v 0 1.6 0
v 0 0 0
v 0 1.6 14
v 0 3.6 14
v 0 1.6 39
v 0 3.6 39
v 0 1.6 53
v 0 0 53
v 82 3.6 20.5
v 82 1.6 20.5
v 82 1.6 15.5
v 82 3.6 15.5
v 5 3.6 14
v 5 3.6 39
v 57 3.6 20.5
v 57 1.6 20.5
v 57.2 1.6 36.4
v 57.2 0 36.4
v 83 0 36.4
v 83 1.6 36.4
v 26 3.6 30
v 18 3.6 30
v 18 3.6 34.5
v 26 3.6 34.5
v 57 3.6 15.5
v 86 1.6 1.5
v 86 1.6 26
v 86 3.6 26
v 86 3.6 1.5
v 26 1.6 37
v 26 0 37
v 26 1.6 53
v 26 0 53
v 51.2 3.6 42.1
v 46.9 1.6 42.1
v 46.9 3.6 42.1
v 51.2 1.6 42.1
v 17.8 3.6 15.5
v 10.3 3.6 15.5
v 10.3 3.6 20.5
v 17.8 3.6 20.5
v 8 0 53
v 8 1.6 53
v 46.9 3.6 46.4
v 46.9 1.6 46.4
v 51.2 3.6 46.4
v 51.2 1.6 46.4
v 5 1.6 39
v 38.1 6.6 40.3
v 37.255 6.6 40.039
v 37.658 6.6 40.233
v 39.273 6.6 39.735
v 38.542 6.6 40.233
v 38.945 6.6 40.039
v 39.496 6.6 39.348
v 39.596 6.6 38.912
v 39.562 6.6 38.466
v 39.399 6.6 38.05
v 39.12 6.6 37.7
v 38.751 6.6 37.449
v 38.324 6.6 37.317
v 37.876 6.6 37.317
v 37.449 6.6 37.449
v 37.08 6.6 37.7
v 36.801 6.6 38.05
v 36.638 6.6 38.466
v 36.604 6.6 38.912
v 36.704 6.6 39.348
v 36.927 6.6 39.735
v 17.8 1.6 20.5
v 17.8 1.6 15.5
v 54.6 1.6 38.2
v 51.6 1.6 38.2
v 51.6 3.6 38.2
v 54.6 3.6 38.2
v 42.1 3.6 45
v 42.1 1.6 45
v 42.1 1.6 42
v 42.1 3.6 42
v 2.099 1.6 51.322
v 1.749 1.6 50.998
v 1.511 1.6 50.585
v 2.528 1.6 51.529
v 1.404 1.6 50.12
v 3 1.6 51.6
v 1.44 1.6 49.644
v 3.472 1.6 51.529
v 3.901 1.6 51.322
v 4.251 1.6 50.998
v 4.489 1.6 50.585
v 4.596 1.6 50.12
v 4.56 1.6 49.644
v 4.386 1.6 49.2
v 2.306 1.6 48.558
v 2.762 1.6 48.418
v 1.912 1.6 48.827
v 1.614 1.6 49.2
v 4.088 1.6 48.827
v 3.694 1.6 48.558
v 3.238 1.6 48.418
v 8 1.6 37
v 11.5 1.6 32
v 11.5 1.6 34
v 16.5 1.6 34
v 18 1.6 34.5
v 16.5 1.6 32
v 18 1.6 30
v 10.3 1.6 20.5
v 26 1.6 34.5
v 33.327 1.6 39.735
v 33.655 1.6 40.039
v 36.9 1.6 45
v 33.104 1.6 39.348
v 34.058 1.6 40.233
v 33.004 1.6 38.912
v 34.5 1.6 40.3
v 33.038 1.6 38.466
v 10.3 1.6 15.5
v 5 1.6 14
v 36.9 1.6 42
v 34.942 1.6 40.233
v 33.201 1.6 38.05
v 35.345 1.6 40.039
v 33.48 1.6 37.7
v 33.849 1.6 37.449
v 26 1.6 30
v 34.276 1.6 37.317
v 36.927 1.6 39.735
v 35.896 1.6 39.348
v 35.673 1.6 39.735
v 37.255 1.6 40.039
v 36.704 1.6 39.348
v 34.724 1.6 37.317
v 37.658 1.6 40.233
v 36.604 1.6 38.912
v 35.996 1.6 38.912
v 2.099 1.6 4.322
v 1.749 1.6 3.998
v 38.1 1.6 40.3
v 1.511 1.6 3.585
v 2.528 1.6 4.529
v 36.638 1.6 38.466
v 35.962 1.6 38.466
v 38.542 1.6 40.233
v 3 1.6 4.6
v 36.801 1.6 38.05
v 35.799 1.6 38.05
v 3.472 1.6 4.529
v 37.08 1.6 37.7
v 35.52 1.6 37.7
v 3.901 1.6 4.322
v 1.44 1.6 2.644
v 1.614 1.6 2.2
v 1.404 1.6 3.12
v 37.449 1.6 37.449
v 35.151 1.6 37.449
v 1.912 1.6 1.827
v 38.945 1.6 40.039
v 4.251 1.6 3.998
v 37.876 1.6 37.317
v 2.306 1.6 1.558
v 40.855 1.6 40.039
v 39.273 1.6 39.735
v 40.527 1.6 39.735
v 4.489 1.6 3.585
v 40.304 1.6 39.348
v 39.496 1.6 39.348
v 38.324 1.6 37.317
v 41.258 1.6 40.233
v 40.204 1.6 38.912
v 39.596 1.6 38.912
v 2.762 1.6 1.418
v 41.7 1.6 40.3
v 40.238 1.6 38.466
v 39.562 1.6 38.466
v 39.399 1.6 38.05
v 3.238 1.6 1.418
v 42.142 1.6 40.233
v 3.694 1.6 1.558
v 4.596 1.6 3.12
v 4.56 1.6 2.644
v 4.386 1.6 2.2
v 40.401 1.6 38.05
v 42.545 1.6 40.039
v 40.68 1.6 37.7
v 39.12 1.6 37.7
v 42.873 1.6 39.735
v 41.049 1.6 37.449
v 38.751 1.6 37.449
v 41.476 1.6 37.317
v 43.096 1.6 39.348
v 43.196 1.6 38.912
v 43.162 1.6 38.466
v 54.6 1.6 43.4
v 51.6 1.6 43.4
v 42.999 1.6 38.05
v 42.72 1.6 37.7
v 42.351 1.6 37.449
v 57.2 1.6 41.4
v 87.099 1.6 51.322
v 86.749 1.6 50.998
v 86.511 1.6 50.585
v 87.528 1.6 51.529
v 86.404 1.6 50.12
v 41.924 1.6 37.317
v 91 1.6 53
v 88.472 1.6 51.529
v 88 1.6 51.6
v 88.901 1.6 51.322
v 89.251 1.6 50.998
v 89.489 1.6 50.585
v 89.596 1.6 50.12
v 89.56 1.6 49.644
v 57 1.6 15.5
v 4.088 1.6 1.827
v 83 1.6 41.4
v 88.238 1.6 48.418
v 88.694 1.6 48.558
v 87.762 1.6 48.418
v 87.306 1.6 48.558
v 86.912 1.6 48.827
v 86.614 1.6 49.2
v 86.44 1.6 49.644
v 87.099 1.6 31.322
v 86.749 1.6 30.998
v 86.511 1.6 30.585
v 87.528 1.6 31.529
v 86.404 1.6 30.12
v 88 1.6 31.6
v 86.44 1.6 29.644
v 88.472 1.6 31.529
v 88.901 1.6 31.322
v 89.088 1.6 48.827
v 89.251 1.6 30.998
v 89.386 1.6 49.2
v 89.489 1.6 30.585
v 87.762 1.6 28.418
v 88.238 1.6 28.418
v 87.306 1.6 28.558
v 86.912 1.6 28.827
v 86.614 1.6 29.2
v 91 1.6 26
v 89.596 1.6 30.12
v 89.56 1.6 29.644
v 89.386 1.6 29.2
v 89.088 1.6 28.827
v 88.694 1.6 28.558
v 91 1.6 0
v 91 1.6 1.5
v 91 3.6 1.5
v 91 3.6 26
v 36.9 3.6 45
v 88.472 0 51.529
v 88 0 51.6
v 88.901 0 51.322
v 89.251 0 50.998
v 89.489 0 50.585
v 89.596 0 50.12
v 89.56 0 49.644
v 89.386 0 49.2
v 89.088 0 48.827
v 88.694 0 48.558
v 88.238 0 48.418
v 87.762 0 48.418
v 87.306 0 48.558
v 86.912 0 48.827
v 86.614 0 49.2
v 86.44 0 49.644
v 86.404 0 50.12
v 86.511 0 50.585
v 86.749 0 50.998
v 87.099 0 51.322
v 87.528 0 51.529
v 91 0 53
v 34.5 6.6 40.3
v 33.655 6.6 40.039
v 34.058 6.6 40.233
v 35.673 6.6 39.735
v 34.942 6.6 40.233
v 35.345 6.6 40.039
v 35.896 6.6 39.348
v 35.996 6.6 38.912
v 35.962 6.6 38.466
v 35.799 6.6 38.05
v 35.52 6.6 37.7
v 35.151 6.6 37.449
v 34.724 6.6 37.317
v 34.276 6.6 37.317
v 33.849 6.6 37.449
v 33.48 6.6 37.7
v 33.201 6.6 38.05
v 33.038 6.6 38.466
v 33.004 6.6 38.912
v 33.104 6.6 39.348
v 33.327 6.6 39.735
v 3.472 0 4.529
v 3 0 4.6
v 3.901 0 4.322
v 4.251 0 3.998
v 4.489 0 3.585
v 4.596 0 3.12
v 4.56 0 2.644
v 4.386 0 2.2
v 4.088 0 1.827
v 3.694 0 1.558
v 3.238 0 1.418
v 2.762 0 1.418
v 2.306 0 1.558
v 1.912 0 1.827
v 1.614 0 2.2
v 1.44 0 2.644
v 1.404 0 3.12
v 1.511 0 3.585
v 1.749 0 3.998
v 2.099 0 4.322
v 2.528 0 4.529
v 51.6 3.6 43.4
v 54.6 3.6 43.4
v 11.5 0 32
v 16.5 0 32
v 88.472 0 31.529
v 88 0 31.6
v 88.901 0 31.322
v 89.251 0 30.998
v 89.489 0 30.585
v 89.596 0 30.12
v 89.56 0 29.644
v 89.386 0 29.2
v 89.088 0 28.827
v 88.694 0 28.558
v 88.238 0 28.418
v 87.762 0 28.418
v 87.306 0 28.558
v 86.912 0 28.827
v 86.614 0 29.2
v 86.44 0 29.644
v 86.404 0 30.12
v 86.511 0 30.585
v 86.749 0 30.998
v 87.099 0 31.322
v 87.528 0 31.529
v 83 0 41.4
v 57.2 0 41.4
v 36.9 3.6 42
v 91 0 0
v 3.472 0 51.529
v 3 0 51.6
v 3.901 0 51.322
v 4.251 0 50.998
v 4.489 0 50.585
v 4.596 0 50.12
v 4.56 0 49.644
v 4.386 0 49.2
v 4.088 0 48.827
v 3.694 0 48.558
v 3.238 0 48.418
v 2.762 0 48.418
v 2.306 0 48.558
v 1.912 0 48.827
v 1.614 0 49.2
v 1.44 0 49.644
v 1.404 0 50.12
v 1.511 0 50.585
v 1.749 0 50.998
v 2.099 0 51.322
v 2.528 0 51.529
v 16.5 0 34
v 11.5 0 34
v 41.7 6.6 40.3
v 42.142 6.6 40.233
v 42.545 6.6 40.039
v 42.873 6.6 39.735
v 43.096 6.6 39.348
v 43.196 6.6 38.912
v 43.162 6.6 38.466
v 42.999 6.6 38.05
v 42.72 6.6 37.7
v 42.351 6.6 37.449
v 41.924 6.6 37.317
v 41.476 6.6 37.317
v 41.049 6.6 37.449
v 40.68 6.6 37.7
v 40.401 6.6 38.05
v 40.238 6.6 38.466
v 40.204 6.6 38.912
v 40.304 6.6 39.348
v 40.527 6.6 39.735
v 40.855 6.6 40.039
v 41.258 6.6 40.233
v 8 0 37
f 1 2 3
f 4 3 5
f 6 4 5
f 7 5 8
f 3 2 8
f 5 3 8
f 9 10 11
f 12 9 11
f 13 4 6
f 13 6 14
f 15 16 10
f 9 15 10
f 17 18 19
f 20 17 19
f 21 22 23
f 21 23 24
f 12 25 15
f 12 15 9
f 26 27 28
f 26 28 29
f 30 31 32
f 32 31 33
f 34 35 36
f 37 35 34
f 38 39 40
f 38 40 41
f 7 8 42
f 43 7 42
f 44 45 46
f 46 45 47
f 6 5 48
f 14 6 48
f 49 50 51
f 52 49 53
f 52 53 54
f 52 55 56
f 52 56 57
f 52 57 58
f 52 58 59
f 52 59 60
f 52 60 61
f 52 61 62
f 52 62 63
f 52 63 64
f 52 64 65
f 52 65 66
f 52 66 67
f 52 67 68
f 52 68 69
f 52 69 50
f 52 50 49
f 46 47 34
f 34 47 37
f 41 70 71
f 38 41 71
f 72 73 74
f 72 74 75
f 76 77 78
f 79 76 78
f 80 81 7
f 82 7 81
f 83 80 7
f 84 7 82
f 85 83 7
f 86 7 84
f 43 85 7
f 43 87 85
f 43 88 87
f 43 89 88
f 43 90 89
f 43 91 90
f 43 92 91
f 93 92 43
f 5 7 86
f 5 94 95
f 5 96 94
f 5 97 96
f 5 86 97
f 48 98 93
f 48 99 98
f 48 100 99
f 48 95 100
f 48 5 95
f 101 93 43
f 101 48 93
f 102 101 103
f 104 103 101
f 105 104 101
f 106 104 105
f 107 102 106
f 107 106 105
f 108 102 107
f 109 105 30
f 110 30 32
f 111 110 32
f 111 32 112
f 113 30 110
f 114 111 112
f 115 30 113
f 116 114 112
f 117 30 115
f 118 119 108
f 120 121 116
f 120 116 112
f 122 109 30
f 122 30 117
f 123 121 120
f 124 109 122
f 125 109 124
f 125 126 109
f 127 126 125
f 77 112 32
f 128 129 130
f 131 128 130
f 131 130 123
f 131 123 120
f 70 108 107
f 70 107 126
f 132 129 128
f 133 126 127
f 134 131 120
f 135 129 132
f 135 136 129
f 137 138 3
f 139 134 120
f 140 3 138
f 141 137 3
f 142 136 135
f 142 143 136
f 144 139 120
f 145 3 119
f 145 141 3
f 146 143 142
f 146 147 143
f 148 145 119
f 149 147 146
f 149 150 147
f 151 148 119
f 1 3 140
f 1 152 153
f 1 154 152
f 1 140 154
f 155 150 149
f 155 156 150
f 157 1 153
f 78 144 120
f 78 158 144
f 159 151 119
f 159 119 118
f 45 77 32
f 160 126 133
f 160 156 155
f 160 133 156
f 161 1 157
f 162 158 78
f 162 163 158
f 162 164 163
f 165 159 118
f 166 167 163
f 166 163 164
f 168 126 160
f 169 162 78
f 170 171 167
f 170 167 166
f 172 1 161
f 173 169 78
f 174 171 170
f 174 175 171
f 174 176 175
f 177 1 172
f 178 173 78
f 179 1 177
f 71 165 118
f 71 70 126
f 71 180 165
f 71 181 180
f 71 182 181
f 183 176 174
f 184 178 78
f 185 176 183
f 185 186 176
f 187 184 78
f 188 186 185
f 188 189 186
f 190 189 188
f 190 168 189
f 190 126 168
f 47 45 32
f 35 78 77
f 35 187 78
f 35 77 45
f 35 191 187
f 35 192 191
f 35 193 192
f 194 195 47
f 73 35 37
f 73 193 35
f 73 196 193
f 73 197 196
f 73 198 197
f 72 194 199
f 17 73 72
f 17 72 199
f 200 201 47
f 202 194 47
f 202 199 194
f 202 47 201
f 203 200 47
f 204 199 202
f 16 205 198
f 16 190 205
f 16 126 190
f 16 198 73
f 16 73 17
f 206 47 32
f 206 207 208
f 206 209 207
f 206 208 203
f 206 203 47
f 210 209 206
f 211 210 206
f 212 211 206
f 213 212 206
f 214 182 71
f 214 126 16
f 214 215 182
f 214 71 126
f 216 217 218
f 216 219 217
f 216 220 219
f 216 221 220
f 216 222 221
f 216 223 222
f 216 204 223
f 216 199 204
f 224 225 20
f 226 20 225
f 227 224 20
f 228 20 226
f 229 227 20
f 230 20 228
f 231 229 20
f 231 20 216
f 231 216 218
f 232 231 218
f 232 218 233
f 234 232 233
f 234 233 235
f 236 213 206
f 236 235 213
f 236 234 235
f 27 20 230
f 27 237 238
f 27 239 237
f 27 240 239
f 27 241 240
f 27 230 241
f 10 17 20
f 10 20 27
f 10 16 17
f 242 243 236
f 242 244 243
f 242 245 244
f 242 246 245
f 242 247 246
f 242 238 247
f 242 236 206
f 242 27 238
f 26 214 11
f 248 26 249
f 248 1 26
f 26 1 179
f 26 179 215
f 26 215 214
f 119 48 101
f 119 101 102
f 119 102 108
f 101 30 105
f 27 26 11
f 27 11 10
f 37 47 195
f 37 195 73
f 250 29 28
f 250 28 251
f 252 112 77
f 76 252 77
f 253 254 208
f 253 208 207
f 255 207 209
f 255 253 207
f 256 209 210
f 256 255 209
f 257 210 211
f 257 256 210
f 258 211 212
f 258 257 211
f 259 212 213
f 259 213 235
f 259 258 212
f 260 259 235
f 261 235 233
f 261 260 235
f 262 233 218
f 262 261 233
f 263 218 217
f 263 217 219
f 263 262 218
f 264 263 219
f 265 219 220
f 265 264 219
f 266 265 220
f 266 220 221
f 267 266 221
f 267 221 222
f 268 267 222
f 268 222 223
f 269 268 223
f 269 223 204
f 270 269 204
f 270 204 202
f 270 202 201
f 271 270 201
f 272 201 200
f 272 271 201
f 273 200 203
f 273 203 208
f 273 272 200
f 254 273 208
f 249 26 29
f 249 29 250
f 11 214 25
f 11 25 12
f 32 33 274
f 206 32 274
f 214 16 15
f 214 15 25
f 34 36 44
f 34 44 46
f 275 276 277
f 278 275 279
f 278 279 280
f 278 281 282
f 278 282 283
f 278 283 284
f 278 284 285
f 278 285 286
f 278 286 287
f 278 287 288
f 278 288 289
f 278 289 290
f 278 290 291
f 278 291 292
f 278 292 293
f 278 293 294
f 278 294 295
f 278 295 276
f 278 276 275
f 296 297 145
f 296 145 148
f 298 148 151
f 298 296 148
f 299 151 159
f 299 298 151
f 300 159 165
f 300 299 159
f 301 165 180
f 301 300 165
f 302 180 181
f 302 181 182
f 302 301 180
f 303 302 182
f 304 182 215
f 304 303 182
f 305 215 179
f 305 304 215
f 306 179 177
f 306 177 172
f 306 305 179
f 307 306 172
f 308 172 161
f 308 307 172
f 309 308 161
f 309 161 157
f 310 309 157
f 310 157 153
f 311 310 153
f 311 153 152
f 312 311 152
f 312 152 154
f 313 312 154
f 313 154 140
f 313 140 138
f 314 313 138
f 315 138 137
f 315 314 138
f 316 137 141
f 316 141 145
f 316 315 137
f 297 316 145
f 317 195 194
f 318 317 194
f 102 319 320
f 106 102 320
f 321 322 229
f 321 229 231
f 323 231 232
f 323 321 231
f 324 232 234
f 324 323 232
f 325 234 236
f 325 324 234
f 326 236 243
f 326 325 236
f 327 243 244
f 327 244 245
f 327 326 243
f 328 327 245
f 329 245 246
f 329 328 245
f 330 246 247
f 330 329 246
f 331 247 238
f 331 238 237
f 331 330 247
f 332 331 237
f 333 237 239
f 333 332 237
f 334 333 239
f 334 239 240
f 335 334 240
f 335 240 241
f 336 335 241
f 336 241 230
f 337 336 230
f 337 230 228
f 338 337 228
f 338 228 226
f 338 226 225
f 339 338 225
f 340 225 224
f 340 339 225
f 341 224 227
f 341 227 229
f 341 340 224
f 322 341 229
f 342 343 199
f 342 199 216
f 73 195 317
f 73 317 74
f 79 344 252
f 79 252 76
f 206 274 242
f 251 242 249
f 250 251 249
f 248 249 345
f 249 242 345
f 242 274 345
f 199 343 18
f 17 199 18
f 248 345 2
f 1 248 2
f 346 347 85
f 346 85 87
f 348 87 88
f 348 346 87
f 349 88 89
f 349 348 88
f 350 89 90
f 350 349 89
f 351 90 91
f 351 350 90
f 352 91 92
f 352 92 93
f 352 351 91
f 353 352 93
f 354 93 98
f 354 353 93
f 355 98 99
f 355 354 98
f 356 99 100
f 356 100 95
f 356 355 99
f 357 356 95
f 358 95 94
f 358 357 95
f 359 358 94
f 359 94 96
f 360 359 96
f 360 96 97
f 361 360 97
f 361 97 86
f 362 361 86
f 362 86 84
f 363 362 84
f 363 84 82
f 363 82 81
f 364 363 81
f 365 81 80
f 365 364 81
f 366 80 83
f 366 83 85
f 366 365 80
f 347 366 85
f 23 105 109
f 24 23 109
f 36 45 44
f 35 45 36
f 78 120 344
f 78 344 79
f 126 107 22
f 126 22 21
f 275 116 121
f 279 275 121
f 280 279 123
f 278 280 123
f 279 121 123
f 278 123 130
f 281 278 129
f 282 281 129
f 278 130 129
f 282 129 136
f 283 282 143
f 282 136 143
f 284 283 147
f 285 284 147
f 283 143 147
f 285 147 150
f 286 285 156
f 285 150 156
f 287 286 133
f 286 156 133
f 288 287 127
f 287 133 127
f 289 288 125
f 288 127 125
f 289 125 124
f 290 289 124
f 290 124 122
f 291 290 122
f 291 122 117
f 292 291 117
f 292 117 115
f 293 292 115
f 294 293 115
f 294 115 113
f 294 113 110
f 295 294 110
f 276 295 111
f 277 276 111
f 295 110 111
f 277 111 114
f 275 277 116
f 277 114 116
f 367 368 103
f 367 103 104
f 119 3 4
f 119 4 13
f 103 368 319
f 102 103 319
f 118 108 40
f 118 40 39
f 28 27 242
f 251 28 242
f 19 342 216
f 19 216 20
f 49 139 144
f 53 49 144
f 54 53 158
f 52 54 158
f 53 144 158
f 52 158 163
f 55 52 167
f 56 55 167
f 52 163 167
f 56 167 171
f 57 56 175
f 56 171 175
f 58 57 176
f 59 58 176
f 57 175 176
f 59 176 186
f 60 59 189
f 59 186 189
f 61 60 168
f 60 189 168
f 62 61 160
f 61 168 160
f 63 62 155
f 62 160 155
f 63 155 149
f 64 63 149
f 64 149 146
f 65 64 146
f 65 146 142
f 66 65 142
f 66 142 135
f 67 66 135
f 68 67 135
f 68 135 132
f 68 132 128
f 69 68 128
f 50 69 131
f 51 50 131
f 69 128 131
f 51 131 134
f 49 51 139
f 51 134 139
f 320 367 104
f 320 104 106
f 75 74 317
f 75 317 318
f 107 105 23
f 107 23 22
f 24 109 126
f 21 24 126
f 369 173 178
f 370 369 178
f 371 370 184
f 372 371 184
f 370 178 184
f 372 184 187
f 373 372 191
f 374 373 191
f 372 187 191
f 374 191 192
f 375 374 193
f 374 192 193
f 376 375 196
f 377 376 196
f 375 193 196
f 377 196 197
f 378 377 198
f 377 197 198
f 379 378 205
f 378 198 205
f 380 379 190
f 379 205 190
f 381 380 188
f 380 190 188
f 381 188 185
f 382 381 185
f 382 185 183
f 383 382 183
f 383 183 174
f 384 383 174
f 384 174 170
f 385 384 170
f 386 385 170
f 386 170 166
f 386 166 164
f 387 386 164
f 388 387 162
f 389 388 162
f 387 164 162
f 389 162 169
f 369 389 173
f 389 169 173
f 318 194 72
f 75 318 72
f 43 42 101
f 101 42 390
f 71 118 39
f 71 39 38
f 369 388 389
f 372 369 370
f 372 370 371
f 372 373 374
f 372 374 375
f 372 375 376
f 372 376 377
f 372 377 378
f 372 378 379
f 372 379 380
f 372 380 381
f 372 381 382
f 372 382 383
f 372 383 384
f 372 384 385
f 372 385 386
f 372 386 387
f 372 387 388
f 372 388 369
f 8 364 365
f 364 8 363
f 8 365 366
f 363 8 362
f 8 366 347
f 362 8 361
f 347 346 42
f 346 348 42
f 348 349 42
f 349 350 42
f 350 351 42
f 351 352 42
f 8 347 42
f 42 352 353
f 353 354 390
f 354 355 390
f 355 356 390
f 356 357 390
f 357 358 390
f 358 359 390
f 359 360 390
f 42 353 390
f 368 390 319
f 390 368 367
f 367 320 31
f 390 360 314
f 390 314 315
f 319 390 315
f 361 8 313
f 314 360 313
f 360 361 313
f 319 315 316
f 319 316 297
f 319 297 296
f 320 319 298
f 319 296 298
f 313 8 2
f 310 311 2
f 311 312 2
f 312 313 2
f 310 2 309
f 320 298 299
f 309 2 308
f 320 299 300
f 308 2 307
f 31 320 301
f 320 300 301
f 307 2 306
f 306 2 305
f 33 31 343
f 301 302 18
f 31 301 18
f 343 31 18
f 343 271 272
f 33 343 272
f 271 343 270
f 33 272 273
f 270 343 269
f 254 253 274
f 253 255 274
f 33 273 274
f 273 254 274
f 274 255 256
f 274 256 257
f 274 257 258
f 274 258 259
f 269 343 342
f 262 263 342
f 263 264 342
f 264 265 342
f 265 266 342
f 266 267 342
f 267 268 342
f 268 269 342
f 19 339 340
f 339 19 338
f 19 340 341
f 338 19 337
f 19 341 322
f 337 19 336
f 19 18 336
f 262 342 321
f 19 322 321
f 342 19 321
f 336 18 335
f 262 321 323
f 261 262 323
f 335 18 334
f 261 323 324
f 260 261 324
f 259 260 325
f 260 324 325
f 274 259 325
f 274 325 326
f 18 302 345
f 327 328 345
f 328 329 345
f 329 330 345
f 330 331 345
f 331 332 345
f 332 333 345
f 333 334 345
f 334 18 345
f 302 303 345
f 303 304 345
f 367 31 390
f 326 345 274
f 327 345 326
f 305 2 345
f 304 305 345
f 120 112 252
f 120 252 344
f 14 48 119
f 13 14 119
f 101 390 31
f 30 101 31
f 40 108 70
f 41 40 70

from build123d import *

# Parameters (mm, degrees)
SKETCH_2_R      = 1.6
SKETCH_2_W      = 5
SKETCH_2_H      = 2
SKETCH_2_W_2    = 25.8
SKETCH_2_H_2    = 5
EXTRUDE_1_DEPTH = 1.6
SKETCH_3_W      = 5
SKETCH_3_H      = 25
SKETCH_3_W_2    = 7.5
SKETCH_3_H_2    = 5
SKETCH_3_W_3    = 8
SKETCH_3_H_3    = 4.5
SKETCH_3_W_4    = 25
SKETCH_3_H_4    = 24.5
EXTRUDE_2_DEPTH = 2
SKETCH_4_R      = 1.5
EXTRUDE_3_DEPTH = 5
SKETCH_5_W      = 5.2
SKETCH_5_H      = 3
SKETCH_5_W_2    = 4.3
SKETCH_5_H_2    = 4.3
SKETCH_5_W_3    = 3
SKETCH_5_H_3    = 5.2
EXTRUDE_4_DEPTH = 2


with BuildPart() as part:
    # 草图2 → 凸台-拉伸1 (new body)
    with BuildSketch(Plane(origin=(0, 0, 0), x_dir=(1, 0, 0), z_dir=(0, 1, 0))):
        Polygon((0, 0), (0, -53), (8, -53), (8, -37), (26, -37), (26, -53), (91, -53), (91, 0), align=None)
        with Locations(Location((3, -50, 0), (0, 0, 270))):
            Circle(SKETCH_2_R, mode=Mode.SUBTRACT)
        with Locations(Location((3, -3, 0), (0, 0, 270))):
            Circle(SKETCH_2_R, mode=Mode.SUBTRACT)
        with Locations(Location((88, -30, 0), (0, 0, 270))):
            Circle(SKETCH_2_R, mode=Mode.SUBTRACT)
        with Locations(Location((88, -50, 0), (0, 0, 270))):
            Circle(SKETCH_2_R, mode=Mode.SUBTRACT)
        with Locations((14, -33)):
            Rectangle(SKETCH_2_W, SKETCH_2_H, mode=Mode.SUBTRACT)
        with Locations((70.1, -38.9)):
            Rectangle(SKETCH_2_W_2, SKETCH_2_H_2, mode=Mode.SUBTRACT)
    extrude(amount=EXTRUDE_1_DEPTH)

    # 草图3 → 凸台-拉伸2 (add)
    with BuildSketch(Plane(origin=(0, 1.6, 0), x_dir=(1, 0, 0), z_dir=(0, 1, 0))):
        with Locations((2.5, -26.5)):
            Rectangle(SKETCH_3_W, SKETCH_3_H)
        with Locations((14.05, -18)):
            Rectangle(SKETCH_3_W_2, SKETCH_3_H_2)
        with Locations((22, -32.25)):
            Rectangle(SKETCH_3_W_3, SKETCH_3_H_3)
        with Locations((69.5, -18)):
            Rectangle(SKETCH_3_W_4, SKETCH_3_H_2)
        with Locations((88.5, -13.75)):
            Rectangle(SKETCH_3_W, SKETCH_3_H_4)
    extrude(amount=EXTRUDE_2_DEPTH)

    # 草图4 → 凸台-拉伸3 (add)
    with BuildSketch(Plane(origin=(0, 1.6, 0), x_dir=(1, 0, 0), z_dir=(0, 1, 0))):
        with Locations(Location((34.5, -38.8, 0), (0, 0, 270))):
            Circle(SKETCH_4_R)
        with Locations(Location((38.1, -38.8, 0), (0, 0, 270))):
            Circle(SKETCH_4_R)
        with Locations(Location((41.7, -38.8, 0), (0, 0, 270))):
            Circle(SKETCH_4_R)
    extrude(amount=EXTRUDE_3_DEPTH)

    # 草图5 → 凸台-拉伸4 (add)
    with BuildSketch(Plane(origin=(0, 1.6, 0), x_dir=(1, 0, 0), z_dir=(0, 1, 0))):
        with Locations((39.5, -43.5)):
            Rectangle(SKETCH_5_W, SKETCH_5_H)
        with Locations((49.05, -44.25)):
            Rectangle(SKETCH_5_W_2, SKETCH_5_H_2)
        with Locations((53.1, -40.8)):
            Rectangle(SKETCH_5_W_3, SKETCH_5_H_3)
    extrude(amount=EXTRUDE_4_DEPTH)


solid = part.part
